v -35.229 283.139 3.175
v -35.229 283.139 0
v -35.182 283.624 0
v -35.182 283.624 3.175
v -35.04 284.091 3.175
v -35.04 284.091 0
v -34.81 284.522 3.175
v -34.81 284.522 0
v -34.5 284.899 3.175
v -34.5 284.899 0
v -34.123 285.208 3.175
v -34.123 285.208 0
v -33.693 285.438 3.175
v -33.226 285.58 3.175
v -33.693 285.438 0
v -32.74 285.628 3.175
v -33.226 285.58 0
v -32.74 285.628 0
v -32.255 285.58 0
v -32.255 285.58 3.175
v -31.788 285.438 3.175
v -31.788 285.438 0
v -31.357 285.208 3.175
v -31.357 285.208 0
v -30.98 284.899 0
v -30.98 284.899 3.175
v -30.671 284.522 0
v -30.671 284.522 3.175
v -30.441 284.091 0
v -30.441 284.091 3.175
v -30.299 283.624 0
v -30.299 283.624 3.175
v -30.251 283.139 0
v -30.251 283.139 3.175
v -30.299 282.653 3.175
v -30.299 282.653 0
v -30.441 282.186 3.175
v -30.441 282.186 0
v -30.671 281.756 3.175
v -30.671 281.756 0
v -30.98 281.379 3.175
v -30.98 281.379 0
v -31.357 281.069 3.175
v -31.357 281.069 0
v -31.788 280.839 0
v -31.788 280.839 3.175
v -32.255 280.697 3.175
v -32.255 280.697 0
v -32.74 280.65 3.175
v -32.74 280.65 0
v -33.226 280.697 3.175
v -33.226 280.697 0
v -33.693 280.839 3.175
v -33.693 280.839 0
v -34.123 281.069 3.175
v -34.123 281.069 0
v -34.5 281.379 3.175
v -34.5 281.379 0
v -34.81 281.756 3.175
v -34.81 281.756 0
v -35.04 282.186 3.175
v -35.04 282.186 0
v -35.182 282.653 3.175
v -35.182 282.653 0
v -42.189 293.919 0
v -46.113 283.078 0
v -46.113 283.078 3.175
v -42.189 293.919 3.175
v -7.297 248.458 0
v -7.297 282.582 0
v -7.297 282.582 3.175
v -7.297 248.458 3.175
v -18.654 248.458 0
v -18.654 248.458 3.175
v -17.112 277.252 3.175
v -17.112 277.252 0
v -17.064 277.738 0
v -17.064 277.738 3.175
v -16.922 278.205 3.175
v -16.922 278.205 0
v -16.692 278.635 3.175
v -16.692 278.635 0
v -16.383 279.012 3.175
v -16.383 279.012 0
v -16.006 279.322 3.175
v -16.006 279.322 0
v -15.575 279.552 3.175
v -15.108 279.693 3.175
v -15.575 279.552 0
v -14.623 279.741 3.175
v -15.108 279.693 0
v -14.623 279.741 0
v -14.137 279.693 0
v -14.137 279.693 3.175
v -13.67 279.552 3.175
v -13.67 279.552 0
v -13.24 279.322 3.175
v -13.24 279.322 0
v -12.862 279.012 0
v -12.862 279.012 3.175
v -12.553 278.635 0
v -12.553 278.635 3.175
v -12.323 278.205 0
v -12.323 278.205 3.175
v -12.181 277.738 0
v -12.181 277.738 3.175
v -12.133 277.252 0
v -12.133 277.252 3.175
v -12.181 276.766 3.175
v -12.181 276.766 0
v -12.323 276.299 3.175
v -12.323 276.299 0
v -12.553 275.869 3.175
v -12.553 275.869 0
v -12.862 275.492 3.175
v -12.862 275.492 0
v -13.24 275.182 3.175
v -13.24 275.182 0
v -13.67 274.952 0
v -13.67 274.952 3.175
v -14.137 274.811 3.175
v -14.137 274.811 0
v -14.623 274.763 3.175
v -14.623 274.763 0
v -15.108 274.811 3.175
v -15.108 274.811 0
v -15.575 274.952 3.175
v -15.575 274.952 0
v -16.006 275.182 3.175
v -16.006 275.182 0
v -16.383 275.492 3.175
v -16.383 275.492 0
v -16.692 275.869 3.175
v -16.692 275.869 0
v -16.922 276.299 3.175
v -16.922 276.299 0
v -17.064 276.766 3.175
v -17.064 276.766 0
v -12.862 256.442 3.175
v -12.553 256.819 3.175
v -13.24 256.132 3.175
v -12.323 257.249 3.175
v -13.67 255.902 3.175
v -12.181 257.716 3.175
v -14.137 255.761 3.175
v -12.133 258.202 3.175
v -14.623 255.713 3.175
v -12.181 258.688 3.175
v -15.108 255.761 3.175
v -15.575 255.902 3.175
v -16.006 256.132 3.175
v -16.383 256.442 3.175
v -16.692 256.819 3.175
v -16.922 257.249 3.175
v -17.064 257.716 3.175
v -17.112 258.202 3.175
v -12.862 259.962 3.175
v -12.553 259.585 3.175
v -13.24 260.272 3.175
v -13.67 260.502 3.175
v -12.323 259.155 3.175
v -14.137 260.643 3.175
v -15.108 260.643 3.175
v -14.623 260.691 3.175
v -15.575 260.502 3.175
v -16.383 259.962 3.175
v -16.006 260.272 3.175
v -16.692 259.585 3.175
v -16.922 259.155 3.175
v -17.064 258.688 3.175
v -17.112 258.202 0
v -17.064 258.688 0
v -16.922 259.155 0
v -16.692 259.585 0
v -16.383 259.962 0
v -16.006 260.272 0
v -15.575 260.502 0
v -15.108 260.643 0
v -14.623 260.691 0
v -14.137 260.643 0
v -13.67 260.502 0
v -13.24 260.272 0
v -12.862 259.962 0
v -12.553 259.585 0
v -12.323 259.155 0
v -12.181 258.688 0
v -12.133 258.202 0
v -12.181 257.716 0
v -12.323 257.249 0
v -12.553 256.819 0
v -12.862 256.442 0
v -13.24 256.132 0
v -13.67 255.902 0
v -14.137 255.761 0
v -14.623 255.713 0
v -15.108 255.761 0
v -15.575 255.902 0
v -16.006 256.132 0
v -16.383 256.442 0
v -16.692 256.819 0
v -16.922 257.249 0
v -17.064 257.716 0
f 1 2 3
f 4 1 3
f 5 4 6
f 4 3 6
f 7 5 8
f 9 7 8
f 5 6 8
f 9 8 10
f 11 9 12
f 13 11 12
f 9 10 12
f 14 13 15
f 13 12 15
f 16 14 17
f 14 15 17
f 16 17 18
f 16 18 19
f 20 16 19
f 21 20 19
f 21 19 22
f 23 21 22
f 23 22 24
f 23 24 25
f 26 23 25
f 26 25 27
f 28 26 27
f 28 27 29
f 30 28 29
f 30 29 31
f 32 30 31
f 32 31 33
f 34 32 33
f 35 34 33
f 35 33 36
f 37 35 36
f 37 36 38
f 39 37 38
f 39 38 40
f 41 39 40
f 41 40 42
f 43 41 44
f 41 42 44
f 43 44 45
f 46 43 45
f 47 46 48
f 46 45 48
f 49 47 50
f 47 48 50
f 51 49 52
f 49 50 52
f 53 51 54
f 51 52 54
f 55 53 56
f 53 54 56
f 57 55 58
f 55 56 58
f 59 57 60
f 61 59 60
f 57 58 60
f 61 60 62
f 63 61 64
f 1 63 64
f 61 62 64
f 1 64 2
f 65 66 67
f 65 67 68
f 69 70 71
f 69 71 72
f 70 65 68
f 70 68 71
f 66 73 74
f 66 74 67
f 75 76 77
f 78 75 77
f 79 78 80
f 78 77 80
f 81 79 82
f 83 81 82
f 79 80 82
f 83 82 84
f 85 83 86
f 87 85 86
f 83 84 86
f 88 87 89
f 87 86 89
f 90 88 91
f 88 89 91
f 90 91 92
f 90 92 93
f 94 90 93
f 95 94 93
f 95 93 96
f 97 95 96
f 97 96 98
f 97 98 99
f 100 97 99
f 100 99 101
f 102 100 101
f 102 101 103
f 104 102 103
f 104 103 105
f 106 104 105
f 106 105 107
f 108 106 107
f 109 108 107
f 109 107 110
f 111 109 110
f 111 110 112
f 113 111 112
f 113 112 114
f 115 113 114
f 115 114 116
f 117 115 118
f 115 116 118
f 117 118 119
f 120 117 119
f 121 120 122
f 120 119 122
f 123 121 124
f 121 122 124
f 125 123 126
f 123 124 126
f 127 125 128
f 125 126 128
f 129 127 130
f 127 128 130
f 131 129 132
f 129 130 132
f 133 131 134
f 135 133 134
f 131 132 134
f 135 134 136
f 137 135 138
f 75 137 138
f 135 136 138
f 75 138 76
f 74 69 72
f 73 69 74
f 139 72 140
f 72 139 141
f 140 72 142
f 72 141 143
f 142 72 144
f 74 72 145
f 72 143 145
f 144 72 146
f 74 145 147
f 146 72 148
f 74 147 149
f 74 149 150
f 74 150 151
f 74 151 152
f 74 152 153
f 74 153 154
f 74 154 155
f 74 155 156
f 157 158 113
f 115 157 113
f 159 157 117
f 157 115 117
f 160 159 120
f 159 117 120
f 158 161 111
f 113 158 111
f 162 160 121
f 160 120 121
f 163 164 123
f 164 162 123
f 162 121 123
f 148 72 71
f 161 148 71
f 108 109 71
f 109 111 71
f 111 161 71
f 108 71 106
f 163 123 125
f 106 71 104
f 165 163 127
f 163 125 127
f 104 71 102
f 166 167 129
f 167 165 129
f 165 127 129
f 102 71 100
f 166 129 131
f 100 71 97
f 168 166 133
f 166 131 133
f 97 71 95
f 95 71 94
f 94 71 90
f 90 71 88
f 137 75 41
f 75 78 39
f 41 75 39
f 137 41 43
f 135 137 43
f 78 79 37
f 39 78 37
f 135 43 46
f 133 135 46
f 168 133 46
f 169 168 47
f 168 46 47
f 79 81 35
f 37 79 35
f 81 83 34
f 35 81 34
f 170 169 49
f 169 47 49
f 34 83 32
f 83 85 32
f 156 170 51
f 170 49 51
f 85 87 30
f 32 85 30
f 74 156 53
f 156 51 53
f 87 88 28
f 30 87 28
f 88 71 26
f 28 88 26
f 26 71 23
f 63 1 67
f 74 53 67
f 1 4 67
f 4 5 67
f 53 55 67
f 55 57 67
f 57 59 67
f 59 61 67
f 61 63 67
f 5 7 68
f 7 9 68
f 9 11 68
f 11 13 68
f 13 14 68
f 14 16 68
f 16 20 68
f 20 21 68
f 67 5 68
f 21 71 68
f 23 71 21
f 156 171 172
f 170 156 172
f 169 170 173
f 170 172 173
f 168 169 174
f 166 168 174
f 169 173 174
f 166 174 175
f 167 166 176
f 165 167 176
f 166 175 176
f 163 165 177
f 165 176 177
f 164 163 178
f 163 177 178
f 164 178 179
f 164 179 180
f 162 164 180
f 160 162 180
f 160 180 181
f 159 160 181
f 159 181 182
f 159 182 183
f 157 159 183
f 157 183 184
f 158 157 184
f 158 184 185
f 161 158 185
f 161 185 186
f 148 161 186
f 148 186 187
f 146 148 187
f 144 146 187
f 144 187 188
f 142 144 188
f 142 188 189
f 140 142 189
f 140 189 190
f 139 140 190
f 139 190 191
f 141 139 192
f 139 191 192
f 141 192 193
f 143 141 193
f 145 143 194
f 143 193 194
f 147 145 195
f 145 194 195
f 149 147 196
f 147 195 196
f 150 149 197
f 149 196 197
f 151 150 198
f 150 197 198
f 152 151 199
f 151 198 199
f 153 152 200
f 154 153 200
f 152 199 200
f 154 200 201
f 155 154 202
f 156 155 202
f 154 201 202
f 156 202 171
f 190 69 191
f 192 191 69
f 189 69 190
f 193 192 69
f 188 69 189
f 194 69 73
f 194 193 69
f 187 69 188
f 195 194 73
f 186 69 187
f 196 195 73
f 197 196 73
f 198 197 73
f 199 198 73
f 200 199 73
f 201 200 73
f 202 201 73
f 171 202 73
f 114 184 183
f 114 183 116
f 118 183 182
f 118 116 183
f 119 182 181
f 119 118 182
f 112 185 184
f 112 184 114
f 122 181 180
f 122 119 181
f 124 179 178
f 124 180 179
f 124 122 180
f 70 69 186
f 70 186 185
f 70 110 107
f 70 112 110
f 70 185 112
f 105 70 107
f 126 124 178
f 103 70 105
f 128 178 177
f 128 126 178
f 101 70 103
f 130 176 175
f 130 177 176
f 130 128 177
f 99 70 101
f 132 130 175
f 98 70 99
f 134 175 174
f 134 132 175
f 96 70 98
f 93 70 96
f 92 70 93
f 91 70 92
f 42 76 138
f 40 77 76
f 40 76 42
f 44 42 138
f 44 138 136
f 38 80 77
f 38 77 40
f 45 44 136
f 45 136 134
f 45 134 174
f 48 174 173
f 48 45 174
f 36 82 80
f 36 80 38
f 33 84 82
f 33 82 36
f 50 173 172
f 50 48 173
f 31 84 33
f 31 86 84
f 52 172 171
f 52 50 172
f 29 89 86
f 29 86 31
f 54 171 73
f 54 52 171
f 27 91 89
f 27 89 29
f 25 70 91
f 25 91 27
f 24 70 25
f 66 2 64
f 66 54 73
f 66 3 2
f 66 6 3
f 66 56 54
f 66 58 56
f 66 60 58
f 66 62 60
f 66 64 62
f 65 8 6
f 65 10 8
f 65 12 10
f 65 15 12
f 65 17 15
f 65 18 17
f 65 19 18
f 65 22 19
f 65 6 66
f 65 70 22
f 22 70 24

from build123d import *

# Parameters (mm, degrees)
BOSS_EXTRUDE1_DEPTH    = 3.175
F_10_CLEARANCE_HOLE1_D = 4.9784


with BuildPart() as part:
    # Sketch4 → Boss-Extrude1 (new body)
    with BuildSketch(Plane.XY):
        Polygon((-42.188928966, 293.919436917), (-7.296735047, 282.582275868), (-7.296735047, 248.458198081), (-18.653675695, 248.458198081), (-46.113444794, 283.07832781), align=None)
    extrude(amount=BOSS_EXTRUDE1_DEPTH)

    # #10 Clearance Hole1 (through all)
    with Locations(Plane.XY.offset(3.175)):
        with Locations((-32.740251946, 283.138719963), (-14.622625311, 277.25194622), (-14.622625311, 258.20194622)):
            Hole(F_10_CLEARANCE_HOLE1_D / 2)


solid = part.part
